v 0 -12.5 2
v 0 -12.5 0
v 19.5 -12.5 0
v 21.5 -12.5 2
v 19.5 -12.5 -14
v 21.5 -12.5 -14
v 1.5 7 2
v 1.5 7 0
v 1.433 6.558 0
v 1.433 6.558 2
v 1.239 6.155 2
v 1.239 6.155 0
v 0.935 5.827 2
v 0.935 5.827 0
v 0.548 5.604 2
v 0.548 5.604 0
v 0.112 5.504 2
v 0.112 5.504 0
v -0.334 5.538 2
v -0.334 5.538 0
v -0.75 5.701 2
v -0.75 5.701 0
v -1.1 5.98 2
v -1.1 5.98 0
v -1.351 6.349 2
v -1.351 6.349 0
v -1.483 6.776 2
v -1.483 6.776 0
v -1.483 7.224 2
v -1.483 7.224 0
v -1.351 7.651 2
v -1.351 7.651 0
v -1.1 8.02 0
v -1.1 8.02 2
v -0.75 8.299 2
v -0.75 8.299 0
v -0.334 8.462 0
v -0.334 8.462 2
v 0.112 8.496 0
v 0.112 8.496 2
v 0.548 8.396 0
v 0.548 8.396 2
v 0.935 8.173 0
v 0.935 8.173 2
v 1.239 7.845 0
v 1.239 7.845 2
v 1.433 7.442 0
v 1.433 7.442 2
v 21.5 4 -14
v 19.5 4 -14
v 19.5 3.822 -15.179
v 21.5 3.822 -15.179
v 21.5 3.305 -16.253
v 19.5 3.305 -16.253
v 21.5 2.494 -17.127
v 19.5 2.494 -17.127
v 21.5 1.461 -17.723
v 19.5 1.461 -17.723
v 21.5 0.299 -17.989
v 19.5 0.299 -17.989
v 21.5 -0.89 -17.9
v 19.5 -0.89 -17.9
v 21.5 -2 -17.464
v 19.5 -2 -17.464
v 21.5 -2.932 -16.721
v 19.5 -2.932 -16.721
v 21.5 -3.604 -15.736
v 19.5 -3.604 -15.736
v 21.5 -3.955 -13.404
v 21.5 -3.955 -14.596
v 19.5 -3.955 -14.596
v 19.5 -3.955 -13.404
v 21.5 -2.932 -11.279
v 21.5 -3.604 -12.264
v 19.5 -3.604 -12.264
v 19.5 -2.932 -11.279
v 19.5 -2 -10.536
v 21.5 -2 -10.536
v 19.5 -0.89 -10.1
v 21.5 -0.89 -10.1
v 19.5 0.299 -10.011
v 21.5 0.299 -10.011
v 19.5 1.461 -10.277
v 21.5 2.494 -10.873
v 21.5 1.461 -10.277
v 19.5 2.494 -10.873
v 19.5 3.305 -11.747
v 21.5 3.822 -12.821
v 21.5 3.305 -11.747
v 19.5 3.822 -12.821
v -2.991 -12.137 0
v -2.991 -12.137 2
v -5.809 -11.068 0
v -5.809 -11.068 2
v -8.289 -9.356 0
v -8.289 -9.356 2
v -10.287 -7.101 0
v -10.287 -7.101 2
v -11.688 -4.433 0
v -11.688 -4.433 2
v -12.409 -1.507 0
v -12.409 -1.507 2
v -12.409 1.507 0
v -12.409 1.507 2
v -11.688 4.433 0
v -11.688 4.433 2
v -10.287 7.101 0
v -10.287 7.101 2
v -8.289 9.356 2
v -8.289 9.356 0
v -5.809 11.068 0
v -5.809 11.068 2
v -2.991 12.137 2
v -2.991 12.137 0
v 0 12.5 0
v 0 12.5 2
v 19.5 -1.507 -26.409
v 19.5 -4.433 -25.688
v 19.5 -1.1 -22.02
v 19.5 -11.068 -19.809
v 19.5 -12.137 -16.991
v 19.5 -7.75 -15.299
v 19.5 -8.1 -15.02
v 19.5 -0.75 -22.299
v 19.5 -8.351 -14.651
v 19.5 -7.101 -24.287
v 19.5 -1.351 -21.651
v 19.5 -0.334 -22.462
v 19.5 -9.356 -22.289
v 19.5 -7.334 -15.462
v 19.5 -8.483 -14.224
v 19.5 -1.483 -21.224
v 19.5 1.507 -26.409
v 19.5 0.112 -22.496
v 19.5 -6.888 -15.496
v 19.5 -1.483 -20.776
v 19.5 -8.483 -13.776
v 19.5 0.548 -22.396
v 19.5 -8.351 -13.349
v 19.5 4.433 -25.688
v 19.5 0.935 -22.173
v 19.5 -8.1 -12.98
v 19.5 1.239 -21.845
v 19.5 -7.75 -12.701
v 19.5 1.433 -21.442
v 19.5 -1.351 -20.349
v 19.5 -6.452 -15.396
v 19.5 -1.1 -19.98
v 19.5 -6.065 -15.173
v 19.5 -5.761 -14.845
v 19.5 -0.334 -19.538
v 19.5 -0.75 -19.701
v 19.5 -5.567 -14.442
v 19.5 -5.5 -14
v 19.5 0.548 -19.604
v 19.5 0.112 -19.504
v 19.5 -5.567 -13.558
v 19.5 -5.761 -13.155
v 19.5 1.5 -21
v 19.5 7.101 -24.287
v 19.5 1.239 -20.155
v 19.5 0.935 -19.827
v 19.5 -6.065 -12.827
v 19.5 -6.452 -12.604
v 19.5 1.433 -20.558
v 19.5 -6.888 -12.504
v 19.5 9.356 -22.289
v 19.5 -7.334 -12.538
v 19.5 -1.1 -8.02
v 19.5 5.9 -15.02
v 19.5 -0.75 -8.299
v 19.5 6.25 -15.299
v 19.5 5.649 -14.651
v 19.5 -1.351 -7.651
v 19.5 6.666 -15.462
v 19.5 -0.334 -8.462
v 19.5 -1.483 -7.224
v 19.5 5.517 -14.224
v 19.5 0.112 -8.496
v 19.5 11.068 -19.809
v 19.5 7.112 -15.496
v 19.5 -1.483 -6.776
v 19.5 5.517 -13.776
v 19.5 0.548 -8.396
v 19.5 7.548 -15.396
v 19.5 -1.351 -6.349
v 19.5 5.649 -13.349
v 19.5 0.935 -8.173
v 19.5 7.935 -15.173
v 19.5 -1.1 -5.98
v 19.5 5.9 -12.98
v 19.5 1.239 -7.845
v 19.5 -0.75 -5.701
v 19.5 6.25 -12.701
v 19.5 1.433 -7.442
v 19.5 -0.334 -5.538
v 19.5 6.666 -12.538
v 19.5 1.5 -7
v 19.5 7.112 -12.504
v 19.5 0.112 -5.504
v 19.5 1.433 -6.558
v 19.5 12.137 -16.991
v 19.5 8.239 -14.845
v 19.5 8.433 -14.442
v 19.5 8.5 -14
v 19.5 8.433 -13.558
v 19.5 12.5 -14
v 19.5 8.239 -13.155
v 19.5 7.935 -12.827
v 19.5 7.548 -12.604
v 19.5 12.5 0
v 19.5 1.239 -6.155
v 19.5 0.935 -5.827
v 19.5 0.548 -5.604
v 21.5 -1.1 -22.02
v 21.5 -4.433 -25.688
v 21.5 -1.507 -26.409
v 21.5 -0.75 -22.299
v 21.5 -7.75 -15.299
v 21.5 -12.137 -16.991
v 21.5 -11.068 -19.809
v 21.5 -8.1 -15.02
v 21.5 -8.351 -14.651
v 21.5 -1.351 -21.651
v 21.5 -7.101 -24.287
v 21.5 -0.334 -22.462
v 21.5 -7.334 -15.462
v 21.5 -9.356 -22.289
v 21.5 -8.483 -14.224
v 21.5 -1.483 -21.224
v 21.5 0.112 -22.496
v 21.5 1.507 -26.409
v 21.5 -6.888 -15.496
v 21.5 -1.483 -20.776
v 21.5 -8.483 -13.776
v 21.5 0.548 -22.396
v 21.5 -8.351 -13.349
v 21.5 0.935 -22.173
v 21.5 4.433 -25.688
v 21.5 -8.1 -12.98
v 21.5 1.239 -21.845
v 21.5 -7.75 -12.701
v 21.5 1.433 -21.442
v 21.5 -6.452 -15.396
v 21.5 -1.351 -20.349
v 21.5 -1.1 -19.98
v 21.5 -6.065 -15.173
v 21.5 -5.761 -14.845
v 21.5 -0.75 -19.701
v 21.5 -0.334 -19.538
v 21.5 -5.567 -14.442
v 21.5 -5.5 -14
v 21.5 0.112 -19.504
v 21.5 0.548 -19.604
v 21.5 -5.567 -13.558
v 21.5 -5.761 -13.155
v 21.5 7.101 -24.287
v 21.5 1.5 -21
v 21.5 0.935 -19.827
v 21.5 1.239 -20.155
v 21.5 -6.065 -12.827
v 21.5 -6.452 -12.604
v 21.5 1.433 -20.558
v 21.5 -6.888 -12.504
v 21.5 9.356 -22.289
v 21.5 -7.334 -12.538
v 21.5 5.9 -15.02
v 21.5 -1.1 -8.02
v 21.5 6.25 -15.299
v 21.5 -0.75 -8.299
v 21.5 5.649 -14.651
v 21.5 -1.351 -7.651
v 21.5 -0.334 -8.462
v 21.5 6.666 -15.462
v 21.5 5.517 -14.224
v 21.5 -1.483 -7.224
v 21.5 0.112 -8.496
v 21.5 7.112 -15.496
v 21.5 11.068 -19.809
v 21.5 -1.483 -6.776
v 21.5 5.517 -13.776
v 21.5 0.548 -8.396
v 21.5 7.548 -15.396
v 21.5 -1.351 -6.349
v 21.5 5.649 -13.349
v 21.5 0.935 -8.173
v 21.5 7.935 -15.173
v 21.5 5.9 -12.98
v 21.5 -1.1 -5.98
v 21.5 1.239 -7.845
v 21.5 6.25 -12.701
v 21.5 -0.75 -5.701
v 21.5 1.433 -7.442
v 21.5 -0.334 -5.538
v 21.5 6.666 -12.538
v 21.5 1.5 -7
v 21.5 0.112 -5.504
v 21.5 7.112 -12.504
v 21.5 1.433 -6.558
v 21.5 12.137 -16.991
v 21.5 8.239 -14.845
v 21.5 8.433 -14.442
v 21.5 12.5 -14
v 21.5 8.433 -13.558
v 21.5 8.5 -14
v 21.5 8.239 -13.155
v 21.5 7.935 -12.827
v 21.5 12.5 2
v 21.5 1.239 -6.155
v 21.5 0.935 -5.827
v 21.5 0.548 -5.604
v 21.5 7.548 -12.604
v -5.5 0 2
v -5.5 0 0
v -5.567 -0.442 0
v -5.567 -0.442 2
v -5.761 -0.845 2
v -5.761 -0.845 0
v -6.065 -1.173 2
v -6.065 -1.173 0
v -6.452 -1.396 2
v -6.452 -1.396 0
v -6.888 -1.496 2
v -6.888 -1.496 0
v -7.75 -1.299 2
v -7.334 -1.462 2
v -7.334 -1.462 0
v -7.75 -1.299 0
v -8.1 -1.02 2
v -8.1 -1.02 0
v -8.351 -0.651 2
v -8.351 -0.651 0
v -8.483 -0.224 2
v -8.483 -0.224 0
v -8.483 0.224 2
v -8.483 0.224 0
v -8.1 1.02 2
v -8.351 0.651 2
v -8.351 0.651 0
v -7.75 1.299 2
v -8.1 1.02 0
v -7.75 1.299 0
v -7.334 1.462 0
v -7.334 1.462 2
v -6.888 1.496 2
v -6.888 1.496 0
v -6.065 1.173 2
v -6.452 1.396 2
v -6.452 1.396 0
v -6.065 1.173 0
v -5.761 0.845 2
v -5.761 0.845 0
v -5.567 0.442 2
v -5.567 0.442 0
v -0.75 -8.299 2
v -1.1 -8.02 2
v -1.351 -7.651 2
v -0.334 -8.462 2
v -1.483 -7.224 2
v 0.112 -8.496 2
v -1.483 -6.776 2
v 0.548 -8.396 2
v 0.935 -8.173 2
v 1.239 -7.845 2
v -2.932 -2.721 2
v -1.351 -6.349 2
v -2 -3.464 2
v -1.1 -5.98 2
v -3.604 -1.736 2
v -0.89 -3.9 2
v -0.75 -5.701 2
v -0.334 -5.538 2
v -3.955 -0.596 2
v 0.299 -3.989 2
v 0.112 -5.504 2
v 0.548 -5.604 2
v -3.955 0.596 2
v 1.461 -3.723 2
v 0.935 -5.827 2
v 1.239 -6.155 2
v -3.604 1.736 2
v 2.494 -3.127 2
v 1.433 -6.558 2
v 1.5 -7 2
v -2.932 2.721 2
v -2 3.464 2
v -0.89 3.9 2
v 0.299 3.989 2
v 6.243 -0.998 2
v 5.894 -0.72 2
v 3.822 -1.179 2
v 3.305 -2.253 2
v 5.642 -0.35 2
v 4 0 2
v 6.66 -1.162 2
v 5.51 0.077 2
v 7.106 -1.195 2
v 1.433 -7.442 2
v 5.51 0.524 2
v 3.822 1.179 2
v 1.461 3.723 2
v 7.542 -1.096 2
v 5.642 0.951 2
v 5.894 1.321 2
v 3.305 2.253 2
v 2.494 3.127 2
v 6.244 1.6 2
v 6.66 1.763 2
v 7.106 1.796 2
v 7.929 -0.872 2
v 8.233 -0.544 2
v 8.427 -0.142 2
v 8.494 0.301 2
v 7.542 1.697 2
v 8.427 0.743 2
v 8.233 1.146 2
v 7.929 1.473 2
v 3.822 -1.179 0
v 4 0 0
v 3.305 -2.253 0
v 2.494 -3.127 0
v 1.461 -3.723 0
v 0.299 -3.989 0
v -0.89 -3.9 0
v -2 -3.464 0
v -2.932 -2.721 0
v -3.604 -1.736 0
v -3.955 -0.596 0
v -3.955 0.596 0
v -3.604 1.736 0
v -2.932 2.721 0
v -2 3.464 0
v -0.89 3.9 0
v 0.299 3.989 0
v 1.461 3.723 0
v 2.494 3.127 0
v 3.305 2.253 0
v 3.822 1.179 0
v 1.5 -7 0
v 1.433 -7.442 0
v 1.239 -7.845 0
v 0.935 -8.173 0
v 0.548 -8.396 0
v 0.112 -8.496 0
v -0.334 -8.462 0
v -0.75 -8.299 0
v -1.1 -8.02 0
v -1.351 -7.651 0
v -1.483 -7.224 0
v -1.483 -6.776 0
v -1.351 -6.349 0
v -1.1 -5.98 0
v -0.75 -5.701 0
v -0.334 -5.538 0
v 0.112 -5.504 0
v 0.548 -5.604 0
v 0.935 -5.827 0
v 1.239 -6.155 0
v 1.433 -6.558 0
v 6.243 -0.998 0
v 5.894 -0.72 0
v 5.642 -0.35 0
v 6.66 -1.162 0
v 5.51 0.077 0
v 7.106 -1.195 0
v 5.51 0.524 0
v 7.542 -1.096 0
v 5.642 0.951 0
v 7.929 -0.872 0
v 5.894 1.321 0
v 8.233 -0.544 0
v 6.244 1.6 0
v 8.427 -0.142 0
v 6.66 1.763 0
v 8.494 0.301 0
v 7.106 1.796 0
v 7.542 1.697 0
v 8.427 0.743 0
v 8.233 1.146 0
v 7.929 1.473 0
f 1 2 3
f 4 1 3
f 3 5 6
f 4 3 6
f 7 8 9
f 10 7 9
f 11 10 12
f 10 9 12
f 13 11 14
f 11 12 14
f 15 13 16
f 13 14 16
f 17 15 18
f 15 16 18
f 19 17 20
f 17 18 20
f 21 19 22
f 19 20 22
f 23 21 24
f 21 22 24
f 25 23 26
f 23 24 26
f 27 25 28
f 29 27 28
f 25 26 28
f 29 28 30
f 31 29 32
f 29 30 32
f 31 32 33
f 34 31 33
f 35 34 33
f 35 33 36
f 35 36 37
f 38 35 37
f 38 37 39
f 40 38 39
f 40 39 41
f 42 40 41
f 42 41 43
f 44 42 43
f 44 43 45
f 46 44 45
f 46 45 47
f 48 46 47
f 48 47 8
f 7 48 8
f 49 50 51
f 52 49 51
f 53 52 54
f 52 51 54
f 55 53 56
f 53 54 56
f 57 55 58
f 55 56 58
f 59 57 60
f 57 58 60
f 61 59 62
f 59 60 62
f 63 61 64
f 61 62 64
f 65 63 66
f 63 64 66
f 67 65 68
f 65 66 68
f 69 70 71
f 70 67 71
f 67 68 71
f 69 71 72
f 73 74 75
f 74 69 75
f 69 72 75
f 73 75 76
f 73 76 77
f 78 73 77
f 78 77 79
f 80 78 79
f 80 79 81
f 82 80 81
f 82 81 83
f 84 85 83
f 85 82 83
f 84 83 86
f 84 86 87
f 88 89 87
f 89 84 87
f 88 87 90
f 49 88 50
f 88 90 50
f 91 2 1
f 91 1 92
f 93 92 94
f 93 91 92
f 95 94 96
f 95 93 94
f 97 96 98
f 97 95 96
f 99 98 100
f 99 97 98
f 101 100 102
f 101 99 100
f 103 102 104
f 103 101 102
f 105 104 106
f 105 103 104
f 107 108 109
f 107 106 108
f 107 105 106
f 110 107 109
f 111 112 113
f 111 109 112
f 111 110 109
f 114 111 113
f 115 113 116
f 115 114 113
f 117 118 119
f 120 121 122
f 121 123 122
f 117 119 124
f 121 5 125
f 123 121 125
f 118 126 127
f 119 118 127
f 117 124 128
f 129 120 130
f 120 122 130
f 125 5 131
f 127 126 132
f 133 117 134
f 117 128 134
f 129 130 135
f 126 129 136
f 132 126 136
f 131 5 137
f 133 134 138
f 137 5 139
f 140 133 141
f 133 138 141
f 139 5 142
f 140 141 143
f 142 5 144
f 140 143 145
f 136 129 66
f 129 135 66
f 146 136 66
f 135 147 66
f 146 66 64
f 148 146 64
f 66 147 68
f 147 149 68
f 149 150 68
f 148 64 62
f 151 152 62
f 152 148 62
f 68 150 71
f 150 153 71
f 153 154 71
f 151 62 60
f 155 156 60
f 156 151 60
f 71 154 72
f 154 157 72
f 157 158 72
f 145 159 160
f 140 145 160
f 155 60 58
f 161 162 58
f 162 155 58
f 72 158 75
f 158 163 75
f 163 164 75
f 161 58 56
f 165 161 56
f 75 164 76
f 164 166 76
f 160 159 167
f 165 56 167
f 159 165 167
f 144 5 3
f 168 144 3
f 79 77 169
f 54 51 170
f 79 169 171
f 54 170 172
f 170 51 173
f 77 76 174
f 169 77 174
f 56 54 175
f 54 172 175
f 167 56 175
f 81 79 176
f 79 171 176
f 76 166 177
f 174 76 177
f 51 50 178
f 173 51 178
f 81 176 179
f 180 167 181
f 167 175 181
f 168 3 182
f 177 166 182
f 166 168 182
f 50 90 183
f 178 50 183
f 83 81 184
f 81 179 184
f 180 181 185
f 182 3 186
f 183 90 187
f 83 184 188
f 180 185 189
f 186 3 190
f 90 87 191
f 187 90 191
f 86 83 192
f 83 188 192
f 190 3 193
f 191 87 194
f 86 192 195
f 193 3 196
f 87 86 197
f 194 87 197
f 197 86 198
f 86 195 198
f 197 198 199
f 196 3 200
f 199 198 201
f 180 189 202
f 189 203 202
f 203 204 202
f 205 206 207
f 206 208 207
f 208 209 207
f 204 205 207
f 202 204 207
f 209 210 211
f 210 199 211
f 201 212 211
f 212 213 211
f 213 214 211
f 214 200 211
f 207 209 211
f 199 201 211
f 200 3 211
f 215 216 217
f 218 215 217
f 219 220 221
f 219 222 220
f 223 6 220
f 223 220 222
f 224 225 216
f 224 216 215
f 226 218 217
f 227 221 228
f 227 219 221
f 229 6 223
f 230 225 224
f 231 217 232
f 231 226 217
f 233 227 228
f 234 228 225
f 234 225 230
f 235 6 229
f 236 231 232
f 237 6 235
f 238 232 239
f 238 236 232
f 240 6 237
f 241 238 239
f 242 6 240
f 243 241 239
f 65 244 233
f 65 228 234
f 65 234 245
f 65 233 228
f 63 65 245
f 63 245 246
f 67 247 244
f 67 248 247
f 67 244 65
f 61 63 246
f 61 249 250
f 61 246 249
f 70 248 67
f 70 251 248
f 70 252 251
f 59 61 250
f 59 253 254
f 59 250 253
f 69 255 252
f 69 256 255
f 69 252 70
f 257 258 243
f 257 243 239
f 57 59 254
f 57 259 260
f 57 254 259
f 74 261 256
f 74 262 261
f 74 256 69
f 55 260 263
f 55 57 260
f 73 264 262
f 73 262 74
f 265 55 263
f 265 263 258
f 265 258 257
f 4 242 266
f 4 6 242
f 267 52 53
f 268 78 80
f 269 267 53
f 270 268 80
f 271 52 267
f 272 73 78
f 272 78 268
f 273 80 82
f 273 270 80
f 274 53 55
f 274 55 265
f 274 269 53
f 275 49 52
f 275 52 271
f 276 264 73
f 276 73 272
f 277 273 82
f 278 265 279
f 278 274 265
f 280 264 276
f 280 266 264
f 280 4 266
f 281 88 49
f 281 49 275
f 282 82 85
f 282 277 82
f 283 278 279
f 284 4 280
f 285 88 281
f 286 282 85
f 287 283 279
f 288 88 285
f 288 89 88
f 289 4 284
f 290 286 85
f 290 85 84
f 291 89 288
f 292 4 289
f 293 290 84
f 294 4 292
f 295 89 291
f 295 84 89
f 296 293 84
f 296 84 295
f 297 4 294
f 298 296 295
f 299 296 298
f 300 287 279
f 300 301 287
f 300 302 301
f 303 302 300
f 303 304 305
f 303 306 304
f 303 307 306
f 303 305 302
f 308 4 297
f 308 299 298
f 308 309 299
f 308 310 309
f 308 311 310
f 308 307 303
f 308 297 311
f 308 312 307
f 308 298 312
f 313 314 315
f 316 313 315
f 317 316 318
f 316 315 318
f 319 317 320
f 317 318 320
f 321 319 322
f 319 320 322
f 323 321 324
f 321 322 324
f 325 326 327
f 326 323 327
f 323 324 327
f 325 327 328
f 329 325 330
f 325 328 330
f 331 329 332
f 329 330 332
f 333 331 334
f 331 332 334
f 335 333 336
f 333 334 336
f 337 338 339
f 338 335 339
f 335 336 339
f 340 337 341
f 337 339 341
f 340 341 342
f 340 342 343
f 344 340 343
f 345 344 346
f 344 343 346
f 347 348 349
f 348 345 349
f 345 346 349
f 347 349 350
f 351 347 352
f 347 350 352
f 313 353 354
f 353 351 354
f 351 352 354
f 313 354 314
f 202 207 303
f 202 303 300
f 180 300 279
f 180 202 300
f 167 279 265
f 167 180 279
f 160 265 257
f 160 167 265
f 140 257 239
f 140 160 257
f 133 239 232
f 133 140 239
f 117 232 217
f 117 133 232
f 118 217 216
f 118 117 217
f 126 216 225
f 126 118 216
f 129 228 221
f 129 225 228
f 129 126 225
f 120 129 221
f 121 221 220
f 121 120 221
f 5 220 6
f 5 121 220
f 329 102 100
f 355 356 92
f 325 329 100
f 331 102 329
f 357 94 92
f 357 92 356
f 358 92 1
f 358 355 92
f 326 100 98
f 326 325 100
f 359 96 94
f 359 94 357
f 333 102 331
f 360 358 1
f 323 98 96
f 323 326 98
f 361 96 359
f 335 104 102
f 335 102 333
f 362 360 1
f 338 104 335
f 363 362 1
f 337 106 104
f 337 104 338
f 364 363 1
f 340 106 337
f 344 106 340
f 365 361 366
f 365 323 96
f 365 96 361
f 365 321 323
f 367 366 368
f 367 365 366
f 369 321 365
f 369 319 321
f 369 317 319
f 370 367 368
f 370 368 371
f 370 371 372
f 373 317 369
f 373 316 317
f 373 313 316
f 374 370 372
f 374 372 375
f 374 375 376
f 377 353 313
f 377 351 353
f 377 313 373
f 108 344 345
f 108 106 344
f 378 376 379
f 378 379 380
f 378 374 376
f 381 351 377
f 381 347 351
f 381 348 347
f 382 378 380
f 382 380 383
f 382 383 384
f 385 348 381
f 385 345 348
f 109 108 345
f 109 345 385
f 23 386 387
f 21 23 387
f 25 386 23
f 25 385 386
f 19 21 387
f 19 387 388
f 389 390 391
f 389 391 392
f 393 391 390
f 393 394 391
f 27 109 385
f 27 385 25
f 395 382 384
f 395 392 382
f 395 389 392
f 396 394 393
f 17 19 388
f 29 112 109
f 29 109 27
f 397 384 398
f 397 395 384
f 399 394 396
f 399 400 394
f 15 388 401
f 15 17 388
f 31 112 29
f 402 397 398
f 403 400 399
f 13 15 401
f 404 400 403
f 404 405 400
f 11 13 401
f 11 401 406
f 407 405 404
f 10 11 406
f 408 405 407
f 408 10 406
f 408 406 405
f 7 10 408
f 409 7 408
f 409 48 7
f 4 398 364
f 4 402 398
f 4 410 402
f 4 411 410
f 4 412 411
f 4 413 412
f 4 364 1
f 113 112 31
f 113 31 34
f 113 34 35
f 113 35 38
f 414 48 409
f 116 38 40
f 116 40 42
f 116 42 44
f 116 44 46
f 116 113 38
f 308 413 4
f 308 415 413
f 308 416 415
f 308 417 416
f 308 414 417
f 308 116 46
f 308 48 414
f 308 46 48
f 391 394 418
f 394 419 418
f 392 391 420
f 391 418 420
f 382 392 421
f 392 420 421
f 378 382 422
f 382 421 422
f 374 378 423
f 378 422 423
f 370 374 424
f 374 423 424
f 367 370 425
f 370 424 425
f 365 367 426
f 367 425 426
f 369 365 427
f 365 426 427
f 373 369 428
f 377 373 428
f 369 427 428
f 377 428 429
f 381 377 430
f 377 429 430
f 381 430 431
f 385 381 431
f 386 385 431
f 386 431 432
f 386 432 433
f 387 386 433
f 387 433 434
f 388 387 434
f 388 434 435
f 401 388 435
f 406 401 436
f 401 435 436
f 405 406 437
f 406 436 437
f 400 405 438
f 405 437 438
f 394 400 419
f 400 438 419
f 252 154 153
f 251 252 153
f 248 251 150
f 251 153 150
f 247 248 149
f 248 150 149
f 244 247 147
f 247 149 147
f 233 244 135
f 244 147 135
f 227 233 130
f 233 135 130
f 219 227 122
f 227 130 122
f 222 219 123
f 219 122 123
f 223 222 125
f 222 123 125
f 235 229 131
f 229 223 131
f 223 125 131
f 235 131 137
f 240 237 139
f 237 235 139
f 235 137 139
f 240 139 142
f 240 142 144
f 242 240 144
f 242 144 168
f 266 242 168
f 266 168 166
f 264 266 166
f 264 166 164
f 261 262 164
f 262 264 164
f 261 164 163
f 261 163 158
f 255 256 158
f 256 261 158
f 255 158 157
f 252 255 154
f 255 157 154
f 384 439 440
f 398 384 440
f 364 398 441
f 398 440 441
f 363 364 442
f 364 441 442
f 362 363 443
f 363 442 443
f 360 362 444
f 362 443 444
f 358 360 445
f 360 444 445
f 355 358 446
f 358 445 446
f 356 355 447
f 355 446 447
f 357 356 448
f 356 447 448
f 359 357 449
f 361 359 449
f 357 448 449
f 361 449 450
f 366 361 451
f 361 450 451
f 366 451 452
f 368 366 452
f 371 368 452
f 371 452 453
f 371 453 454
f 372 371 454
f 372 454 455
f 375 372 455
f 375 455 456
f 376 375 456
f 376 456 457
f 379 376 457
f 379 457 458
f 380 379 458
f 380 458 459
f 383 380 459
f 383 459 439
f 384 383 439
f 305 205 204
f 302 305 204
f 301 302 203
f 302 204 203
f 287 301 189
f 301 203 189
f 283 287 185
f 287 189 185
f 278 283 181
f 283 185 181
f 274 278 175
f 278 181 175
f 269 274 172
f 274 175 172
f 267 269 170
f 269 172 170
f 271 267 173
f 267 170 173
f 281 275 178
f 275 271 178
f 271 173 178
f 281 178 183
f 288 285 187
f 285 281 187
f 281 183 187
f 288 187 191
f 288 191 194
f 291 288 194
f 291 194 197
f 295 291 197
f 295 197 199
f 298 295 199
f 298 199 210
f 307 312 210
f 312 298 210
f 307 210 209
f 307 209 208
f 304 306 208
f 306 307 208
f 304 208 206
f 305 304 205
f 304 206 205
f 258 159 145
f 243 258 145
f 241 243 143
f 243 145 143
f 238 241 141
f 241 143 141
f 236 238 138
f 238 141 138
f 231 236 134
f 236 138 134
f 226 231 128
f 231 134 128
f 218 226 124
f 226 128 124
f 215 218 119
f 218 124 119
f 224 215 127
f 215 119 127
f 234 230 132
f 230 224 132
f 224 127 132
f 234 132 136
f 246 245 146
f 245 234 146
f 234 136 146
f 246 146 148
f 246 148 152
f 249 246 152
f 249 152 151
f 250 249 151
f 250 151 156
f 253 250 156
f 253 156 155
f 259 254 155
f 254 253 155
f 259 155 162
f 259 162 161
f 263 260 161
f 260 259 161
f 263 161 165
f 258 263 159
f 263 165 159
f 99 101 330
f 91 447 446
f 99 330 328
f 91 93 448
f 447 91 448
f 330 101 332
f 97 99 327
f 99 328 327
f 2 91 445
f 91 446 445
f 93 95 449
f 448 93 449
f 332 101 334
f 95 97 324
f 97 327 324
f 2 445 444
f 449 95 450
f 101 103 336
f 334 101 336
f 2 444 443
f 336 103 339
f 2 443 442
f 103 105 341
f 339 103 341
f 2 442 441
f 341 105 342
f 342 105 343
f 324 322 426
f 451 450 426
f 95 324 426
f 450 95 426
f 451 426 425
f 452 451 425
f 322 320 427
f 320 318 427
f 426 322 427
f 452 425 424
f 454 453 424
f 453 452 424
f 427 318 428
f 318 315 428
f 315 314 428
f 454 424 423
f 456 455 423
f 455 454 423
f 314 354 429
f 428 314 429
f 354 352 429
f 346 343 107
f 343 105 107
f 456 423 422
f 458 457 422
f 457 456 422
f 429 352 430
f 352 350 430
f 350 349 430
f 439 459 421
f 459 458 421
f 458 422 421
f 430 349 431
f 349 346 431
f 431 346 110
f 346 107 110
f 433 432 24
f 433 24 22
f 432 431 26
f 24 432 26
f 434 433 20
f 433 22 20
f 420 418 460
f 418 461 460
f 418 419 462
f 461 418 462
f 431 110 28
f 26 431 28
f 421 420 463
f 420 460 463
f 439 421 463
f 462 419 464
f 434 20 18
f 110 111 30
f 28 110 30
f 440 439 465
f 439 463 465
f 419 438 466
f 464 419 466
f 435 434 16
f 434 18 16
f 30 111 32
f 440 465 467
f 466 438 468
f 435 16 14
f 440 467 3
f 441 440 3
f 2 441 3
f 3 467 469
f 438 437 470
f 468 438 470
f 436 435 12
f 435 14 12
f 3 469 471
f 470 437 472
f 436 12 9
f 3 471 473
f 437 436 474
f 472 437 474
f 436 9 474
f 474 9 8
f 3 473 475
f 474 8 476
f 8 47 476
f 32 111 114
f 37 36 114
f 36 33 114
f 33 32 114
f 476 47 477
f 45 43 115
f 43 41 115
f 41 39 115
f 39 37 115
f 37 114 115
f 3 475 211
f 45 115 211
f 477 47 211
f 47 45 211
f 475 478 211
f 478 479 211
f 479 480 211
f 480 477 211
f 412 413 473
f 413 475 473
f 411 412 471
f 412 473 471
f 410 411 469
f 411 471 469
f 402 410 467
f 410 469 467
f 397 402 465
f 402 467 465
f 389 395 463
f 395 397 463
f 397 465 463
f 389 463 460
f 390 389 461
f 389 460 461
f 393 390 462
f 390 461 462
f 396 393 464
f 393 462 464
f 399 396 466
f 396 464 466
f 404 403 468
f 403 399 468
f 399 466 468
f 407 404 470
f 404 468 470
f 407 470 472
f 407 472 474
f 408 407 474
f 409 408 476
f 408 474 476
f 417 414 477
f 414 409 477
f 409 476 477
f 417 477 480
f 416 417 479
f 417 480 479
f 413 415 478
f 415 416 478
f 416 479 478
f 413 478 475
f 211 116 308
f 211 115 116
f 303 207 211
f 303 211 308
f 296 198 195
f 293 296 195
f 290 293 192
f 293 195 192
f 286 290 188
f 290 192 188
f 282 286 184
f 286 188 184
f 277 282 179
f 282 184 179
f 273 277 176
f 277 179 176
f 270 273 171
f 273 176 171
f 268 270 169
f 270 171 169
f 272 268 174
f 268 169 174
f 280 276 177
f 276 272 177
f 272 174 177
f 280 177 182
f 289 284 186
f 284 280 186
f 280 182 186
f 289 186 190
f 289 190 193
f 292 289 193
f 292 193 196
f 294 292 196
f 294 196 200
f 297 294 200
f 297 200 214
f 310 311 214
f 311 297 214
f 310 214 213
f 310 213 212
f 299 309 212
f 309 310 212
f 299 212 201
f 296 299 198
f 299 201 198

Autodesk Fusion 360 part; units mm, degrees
sketch "Boceto1" plane through (0, 0, 0) normal (0, 0, 1) x (1, 0, 0)
  line L0 (0, 12.5) -> (0, -12.5)
  arc A0 (0, 12.5) -> (0, -12.5) centre (0, 0) ccw
  line L1 (0, 12.5) -> (19.5, 12.5)
  line L2 (0, -12.5) -> (19.5, -12.5)
  line L3 (19.5, -12.5) -> (19.5, 12.5)
  circle A1 centre (0, 0) radius 4
  circle A2 centre (0, 0) radius 7 construction
  circle A3 centre (0, 7) radius 1.5
  circle A4 centre (-7, 0) radius 1.5
  circle A5 centre (0, -7) radius 1.5
  circle A6 centre (6.9935, 0.3006) radius 1.5
  dimension "d1" = 25
  dimension "d2" = 19.5
  dimension "d3" = 19.5
  dimension "d4" = 8
  dimension "d5" = 14
  dimension "d6" = 3
  dimension "d7" = 3
  dimension "d8" = 3
  dimension "d9" = 3
extrude "Extruir1" add sketch "Boceto1" along normal blind 2 contours L0 L1 L2 L3 A1 A3 A5 | L0 A0 A1 A3 A5
sketch "Boceto2" plane through (19.5, 0, 0) normal (1, 0, 0) x (0, 1, 0)
  line L0 (-12.5, 0) -> (12.5, 0)
  line L1 (12.5, 0) -> (12.5, 2)
  line L2 (12.5, 2) -> (-12.5, 2)
  line L3 (-12.5, 2) -> (-12.5, 0)
  line L4 (12.5, 0) -> (12.5, -14)
  line L5 (-12.5, 0) -> (-12.5, -14)
  circle A0 centre (0, -14) radius 4
  circle A1 centre (0, -14) radius 7 construction
  circle A2 centre (0, -7) radius 1.5
  circle A3 centre (-7, -14) radius 1.5
  circle A4 centre (0, -21) radius 1.5
  circle A5 centre (7, -14) radius 1.5
  circle A6 centre (0, -14) radius 12.5
  line L6 (-12.5, 2) -> (12.5, 2)
  line L7 (12.5, 2) -> (12.5, 0)
  line L8 (12.5, 0) -> (-12.5, 0)
  line L9 (-12.5, 0) -> (-12.5, 2)
  dimension "d12" = 14
  dimension "d13" = 14
  dimension "d14" = 8
  dimension "d15" = 14
  dimension "d16" = 3
  dimension "d17" = 3
  dimension "d18" = 3
  dimension "d19" = 3
extrude "Extruir2" add sketch "Boceto2" along normal blind 2
equation "d1 = ( 12.5 * 2 ) * 1 mm"
